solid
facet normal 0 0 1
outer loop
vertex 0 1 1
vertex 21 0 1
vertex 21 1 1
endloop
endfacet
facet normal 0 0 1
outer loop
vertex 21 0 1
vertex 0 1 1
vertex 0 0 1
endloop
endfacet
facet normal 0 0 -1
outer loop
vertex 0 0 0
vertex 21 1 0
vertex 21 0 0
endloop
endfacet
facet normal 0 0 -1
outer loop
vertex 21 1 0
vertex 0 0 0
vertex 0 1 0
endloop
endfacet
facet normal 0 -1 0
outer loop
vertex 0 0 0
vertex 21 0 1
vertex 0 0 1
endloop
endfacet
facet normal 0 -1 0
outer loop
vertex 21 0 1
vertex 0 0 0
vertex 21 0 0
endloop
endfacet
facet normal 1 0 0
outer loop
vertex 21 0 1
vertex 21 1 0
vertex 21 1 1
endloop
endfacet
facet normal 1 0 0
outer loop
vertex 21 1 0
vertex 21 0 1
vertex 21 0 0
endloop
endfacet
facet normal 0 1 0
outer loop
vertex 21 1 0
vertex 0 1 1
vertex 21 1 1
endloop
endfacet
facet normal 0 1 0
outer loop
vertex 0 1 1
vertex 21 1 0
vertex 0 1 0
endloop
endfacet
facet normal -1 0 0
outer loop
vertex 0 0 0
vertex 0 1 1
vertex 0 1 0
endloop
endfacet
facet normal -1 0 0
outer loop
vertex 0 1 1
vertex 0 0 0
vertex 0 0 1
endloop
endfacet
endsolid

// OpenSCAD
wall_thickness = 6;
tine_count = 2;
/* [Hidden] */
cleat_stagger = true;

/* [Hidden] */
// ======== include <goews.scad> ========
goews_fundamental_unit = 42;
goews_staggered_x_spacing = goews_fundamental_unit / 2;
module holder() cube([goews_staggered_x_spacing, 1, 1]);

// ======== main.scad (continued) ========
cleat_spacing_x = goews_staggered_x_spacing;

holder();
